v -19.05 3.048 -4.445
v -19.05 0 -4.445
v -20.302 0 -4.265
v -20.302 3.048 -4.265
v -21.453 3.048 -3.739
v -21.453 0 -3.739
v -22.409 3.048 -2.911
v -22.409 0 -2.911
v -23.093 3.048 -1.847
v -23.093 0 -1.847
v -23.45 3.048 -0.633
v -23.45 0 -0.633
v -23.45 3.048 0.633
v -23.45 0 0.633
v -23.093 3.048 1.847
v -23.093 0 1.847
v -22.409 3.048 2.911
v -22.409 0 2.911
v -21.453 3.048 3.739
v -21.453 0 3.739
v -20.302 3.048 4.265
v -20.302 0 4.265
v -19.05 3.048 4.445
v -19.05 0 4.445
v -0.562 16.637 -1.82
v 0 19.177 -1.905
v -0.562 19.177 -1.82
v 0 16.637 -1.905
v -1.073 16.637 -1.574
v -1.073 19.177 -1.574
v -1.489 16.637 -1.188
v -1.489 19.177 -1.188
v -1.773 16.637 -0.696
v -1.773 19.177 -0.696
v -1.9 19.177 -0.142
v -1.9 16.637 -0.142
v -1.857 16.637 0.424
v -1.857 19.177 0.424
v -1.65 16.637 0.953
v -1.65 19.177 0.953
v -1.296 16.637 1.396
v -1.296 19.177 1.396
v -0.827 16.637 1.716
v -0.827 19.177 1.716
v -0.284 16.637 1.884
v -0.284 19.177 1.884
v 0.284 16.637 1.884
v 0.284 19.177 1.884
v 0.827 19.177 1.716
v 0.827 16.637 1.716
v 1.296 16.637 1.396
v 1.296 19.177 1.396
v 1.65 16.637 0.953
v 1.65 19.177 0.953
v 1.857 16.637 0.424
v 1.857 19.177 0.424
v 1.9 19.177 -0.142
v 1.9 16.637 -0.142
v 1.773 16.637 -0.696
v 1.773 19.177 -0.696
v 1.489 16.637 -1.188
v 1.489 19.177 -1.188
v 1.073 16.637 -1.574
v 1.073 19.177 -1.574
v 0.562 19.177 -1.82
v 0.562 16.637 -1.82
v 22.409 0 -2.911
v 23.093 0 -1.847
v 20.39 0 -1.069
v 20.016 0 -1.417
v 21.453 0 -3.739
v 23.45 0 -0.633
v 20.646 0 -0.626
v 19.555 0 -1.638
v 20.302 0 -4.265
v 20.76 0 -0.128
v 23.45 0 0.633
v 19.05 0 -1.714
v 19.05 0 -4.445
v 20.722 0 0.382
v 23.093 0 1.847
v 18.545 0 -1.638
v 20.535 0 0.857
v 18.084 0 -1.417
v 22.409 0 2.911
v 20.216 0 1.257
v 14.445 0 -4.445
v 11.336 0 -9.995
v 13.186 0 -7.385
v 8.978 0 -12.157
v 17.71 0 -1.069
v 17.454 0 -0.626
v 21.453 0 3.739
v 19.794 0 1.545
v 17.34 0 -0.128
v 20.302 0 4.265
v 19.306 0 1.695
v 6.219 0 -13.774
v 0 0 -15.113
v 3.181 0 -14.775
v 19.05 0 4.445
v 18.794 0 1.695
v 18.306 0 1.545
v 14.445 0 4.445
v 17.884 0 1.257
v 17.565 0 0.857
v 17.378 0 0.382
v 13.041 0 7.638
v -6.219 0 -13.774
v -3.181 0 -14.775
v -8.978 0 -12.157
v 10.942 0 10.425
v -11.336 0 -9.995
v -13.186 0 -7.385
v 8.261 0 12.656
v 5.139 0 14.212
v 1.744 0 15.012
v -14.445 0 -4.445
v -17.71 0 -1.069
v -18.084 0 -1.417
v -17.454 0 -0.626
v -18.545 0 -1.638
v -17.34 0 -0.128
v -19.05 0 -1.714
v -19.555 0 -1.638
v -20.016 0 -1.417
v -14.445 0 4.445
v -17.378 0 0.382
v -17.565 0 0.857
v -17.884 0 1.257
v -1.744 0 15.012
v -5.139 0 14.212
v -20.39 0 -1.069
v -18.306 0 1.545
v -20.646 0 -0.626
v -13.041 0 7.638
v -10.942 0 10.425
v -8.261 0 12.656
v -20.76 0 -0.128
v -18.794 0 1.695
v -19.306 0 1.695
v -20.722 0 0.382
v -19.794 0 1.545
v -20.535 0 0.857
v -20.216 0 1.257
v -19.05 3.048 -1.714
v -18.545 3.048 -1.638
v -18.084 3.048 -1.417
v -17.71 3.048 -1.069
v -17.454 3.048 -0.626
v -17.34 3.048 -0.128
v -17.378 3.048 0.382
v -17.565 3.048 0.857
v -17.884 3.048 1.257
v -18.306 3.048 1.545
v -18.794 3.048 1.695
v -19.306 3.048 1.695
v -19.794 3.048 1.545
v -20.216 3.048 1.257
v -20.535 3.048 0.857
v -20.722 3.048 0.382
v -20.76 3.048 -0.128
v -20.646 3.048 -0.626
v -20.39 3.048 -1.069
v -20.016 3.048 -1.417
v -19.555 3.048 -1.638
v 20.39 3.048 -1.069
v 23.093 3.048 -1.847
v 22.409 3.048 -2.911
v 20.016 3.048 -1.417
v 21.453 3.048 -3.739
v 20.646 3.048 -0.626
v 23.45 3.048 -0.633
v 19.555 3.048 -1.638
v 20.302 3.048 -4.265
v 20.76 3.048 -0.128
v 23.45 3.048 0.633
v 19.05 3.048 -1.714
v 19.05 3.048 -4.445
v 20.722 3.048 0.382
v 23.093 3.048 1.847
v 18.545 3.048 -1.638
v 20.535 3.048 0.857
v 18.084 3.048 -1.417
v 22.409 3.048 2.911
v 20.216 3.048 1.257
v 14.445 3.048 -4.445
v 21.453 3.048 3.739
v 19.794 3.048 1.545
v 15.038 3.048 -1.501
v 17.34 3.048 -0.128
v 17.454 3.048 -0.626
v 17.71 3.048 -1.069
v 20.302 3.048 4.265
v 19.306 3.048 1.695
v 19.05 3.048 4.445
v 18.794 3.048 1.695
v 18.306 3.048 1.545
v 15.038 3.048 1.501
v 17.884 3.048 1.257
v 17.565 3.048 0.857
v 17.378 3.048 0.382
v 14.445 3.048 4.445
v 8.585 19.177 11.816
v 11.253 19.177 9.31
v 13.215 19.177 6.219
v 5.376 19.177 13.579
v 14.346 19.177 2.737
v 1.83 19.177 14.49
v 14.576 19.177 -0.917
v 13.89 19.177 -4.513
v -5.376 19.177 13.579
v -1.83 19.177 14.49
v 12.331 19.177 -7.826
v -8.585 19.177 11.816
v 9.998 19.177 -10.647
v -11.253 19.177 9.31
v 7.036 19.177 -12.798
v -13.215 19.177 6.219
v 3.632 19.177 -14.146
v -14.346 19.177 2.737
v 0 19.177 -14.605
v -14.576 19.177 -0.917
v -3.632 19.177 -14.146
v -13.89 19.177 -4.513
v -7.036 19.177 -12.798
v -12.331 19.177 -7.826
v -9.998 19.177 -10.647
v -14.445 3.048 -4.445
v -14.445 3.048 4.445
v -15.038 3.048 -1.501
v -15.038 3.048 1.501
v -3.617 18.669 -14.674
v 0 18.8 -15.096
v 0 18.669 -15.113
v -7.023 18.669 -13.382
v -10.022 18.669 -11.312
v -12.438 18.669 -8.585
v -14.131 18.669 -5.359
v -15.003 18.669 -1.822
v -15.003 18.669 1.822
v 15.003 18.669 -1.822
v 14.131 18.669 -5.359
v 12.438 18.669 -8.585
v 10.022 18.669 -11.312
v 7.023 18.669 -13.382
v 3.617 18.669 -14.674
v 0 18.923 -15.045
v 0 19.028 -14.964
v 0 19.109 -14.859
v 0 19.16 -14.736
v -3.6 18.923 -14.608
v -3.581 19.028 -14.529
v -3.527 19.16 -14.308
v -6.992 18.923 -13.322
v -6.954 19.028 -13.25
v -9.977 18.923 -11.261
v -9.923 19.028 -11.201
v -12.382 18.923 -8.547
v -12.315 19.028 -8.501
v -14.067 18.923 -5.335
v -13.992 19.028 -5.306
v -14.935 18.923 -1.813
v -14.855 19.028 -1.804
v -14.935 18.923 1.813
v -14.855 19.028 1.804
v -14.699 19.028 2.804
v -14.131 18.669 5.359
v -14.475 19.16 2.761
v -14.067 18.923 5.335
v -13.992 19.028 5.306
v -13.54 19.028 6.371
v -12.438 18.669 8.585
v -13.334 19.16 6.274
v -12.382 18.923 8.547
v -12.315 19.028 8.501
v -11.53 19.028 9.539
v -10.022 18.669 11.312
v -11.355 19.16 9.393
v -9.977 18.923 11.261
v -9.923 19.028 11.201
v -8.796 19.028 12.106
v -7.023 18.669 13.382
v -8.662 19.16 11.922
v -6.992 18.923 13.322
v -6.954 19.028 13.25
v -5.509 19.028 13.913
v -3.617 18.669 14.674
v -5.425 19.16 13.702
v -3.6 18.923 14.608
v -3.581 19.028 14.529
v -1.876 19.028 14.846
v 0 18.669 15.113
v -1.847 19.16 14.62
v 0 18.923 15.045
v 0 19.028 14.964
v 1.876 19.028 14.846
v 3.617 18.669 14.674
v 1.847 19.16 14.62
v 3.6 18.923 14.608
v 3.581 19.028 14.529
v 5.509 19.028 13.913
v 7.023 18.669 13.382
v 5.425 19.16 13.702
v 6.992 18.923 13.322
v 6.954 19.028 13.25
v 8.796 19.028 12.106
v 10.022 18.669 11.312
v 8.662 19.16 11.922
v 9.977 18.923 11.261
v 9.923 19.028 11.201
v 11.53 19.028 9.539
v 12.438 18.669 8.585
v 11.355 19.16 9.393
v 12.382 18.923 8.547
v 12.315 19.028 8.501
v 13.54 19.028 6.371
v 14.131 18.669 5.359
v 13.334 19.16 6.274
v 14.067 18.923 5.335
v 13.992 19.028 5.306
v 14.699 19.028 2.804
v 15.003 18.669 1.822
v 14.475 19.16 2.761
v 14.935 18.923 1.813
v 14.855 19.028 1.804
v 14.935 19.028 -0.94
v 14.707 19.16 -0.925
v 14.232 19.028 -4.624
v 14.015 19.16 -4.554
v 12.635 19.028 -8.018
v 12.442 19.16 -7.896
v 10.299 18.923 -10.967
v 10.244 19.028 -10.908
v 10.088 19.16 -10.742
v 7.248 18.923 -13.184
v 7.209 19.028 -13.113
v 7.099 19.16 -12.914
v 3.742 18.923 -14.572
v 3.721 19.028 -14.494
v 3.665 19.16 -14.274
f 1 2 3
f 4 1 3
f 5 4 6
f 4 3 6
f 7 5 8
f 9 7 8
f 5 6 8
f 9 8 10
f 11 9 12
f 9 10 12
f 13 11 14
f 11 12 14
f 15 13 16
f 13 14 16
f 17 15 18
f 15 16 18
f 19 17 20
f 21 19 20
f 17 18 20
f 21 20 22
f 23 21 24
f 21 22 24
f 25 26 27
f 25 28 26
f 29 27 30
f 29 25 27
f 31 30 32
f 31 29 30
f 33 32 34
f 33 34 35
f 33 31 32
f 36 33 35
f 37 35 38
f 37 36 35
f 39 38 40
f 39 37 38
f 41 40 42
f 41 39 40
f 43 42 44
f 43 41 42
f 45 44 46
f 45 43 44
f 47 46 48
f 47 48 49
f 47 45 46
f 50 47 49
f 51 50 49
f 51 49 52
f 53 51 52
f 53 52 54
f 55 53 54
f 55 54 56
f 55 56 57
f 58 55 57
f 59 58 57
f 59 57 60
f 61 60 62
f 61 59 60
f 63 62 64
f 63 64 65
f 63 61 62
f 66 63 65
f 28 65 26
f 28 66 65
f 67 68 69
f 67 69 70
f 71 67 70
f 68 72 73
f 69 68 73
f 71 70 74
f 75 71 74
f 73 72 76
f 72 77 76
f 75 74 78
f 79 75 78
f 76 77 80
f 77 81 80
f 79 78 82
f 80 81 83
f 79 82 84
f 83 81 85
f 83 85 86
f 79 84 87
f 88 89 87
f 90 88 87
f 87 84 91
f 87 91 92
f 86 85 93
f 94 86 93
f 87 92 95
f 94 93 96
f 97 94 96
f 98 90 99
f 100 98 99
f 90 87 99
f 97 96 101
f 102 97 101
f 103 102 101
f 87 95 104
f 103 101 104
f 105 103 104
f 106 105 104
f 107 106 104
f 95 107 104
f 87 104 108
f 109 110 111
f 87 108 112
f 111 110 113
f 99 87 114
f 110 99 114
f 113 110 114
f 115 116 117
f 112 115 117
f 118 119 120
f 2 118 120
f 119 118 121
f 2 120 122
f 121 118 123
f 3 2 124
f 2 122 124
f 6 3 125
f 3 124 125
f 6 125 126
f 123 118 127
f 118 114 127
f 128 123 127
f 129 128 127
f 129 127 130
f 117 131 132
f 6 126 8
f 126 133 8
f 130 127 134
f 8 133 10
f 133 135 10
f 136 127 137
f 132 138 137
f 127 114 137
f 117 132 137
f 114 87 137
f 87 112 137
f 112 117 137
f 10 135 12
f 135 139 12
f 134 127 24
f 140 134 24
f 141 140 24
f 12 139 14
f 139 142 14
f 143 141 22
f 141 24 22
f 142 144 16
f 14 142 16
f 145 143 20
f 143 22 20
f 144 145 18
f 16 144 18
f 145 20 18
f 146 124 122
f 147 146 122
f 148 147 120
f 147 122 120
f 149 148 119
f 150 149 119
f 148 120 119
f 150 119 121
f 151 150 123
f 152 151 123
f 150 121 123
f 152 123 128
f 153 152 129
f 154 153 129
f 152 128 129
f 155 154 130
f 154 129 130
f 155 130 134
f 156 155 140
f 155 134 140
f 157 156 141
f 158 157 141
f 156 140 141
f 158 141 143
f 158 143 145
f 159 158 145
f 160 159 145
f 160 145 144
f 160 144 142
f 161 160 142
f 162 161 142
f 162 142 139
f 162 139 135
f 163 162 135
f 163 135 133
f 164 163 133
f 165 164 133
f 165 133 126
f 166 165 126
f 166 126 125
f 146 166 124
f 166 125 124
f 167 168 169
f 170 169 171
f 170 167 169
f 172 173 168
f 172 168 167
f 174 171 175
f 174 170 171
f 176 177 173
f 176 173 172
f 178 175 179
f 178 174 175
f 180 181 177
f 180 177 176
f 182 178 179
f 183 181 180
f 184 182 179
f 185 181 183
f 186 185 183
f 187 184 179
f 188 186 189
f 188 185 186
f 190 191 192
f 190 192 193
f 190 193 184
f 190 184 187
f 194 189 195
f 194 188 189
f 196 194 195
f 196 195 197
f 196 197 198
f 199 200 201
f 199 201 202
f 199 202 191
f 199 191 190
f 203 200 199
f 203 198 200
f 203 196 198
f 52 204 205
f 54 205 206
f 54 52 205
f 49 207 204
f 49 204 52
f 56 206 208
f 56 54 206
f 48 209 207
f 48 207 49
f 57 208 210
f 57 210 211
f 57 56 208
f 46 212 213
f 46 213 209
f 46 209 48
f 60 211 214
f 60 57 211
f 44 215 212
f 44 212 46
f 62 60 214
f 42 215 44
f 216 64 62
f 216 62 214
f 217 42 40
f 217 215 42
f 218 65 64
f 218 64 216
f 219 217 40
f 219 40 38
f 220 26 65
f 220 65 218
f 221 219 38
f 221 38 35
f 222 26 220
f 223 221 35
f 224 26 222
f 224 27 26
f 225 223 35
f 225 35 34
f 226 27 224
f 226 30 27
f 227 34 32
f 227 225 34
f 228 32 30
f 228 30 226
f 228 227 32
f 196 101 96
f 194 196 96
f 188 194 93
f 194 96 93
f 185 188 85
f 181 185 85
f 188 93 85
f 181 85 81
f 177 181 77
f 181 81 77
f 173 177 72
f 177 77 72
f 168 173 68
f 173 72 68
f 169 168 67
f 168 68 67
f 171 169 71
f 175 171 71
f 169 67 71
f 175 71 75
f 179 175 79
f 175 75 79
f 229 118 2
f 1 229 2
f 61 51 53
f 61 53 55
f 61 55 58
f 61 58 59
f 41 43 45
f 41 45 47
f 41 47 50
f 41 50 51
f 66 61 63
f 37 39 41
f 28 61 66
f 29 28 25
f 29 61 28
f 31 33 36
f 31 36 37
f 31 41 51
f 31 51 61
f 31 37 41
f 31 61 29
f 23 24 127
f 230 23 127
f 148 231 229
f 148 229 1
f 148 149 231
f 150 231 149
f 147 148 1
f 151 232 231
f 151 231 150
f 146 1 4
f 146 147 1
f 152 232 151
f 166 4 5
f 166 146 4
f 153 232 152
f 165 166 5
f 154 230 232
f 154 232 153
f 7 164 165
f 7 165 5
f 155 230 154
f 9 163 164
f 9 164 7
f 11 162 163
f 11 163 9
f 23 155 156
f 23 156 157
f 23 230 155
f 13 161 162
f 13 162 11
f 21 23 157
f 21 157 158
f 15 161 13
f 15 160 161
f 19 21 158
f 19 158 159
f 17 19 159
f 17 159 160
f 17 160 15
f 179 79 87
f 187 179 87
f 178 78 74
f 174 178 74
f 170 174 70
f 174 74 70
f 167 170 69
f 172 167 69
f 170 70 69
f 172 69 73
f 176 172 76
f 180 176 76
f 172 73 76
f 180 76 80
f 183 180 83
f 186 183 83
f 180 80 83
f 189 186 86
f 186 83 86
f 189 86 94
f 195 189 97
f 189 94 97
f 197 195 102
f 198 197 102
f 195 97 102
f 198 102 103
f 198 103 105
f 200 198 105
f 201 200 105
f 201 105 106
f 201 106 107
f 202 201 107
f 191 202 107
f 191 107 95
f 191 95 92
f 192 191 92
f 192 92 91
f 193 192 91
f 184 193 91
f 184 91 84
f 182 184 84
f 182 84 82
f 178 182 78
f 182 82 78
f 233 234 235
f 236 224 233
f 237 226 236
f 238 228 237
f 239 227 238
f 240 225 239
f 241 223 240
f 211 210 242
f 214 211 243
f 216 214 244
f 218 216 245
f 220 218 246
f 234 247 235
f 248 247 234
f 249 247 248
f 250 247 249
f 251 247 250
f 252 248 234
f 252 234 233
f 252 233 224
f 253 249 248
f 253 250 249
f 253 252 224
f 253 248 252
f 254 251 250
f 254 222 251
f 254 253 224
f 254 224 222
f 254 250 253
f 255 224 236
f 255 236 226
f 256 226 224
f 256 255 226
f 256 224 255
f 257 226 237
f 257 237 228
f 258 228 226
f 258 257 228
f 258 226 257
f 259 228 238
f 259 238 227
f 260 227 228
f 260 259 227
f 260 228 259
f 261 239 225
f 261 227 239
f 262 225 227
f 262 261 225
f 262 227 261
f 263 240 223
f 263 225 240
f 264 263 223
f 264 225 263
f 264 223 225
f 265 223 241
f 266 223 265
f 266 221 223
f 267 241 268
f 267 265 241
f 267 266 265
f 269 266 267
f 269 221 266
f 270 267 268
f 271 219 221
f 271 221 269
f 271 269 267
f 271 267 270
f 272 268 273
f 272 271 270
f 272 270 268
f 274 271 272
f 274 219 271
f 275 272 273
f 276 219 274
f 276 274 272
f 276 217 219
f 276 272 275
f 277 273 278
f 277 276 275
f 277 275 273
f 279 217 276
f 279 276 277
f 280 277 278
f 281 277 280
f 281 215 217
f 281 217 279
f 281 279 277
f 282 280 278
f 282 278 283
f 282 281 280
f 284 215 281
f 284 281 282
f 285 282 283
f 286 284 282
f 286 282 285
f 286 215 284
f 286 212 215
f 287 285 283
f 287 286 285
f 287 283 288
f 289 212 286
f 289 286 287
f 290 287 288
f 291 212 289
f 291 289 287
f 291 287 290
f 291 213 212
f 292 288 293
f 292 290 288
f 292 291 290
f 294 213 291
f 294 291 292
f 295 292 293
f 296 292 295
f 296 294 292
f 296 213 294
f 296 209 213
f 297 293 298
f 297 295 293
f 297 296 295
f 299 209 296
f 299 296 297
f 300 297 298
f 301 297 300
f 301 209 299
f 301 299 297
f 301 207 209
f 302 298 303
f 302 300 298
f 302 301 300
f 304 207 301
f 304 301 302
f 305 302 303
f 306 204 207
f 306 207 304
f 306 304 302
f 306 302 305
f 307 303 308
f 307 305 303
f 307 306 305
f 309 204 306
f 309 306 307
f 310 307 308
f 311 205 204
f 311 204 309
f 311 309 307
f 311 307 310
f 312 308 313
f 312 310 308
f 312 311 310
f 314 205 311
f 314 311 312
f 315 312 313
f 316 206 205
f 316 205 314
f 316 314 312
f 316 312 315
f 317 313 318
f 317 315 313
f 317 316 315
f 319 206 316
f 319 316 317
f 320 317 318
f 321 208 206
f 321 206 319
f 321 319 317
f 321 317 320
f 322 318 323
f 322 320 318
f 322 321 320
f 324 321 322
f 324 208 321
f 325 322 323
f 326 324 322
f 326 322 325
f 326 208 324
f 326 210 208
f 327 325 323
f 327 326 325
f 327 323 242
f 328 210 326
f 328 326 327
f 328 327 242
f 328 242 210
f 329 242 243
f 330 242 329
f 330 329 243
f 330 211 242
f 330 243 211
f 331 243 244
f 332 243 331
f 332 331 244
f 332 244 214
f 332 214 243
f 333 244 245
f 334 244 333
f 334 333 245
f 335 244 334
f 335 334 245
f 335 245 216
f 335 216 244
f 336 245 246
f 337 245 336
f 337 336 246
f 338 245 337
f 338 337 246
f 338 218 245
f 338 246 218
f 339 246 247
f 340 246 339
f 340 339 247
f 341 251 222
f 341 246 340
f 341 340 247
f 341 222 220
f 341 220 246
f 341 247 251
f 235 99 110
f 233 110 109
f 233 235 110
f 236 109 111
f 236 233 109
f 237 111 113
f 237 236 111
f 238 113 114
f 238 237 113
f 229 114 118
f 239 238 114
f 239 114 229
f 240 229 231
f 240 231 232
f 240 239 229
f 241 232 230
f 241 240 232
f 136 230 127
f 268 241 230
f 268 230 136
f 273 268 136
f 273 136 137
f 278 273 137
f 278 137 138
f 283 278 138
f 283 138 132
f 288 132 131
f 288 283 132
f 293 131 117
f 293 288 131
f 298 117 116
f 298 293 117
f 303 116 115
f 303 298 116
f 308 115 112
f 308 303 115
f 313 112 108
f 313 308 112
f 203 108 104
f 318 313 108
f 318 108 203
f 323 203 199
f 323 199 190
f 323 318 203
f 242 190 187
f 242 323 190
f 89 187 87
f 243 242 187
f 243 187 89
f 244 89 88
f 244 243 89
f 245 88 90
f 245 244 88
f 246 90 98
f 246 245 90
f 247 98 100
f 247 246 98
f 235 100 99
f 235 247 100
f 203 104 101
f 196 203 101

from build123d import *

# Parameters (mm, degrees)
SKETCH3_R           = 1.7145
BOSS_EXTRUDE1_DEPTH = 3.048
FILLET2_R           = 0.508


with BuildPart() as part:
    # Sketch2 → Revolve1 (revolve)
    with BuildSketch(Plane.XY, mode=Mode.PRIVATE) as revolve1_sk:
        Polygon((0, 0), (15.113, 0), (15.113, 19.177), (1.905, 19.177), (1.905, 16.637), (0, 16.637), align=None)
    revolve(revolve1_sk.sketch.rotate(Axis((0, 0, 0), (0, 1, 0)), 90), axis=Axis((0, 0, 0), (0, 1, 0)))

    # Sketch3 → Boss-Extrude1 (add)
    with BuildSketch(Plane.XZ):
        with BuildLine():
            Line((-19.05, 4.445), (19.05, 4.445))
            ThreePointArc((19.05, 4.445), (23.495, 0), (19.05, -4.445))
            Line((19.05, -4.445), (-19.05, -4.445))
            ThreePointArc((-19.05, -4.445), (-23.495, 0), (-19.05, 4.445))
        make_face()
        with Locations(Location((19.05, 0, 0), (0, 0, 270))):
            Circle(SKETCH3_R, mode=Mode.SUBTRACT)
        with Locations(Location((-19.05, 0, 0), (0, 0, 270))):
            Circle(SKETCH3_R, mode=Mode.SUBTRACT)
    extrude(amount=-BOSS_EXTRUDE1_DEPTH)

    # Fillet2
    fillet2_edges = [part.edges().sort_by_distance(p)[0] for p in [
        (0, 19.177, 15.113),
    ]]
    fillet(fillet2_edges, radius=FILLET2_R)


solid = part.part
